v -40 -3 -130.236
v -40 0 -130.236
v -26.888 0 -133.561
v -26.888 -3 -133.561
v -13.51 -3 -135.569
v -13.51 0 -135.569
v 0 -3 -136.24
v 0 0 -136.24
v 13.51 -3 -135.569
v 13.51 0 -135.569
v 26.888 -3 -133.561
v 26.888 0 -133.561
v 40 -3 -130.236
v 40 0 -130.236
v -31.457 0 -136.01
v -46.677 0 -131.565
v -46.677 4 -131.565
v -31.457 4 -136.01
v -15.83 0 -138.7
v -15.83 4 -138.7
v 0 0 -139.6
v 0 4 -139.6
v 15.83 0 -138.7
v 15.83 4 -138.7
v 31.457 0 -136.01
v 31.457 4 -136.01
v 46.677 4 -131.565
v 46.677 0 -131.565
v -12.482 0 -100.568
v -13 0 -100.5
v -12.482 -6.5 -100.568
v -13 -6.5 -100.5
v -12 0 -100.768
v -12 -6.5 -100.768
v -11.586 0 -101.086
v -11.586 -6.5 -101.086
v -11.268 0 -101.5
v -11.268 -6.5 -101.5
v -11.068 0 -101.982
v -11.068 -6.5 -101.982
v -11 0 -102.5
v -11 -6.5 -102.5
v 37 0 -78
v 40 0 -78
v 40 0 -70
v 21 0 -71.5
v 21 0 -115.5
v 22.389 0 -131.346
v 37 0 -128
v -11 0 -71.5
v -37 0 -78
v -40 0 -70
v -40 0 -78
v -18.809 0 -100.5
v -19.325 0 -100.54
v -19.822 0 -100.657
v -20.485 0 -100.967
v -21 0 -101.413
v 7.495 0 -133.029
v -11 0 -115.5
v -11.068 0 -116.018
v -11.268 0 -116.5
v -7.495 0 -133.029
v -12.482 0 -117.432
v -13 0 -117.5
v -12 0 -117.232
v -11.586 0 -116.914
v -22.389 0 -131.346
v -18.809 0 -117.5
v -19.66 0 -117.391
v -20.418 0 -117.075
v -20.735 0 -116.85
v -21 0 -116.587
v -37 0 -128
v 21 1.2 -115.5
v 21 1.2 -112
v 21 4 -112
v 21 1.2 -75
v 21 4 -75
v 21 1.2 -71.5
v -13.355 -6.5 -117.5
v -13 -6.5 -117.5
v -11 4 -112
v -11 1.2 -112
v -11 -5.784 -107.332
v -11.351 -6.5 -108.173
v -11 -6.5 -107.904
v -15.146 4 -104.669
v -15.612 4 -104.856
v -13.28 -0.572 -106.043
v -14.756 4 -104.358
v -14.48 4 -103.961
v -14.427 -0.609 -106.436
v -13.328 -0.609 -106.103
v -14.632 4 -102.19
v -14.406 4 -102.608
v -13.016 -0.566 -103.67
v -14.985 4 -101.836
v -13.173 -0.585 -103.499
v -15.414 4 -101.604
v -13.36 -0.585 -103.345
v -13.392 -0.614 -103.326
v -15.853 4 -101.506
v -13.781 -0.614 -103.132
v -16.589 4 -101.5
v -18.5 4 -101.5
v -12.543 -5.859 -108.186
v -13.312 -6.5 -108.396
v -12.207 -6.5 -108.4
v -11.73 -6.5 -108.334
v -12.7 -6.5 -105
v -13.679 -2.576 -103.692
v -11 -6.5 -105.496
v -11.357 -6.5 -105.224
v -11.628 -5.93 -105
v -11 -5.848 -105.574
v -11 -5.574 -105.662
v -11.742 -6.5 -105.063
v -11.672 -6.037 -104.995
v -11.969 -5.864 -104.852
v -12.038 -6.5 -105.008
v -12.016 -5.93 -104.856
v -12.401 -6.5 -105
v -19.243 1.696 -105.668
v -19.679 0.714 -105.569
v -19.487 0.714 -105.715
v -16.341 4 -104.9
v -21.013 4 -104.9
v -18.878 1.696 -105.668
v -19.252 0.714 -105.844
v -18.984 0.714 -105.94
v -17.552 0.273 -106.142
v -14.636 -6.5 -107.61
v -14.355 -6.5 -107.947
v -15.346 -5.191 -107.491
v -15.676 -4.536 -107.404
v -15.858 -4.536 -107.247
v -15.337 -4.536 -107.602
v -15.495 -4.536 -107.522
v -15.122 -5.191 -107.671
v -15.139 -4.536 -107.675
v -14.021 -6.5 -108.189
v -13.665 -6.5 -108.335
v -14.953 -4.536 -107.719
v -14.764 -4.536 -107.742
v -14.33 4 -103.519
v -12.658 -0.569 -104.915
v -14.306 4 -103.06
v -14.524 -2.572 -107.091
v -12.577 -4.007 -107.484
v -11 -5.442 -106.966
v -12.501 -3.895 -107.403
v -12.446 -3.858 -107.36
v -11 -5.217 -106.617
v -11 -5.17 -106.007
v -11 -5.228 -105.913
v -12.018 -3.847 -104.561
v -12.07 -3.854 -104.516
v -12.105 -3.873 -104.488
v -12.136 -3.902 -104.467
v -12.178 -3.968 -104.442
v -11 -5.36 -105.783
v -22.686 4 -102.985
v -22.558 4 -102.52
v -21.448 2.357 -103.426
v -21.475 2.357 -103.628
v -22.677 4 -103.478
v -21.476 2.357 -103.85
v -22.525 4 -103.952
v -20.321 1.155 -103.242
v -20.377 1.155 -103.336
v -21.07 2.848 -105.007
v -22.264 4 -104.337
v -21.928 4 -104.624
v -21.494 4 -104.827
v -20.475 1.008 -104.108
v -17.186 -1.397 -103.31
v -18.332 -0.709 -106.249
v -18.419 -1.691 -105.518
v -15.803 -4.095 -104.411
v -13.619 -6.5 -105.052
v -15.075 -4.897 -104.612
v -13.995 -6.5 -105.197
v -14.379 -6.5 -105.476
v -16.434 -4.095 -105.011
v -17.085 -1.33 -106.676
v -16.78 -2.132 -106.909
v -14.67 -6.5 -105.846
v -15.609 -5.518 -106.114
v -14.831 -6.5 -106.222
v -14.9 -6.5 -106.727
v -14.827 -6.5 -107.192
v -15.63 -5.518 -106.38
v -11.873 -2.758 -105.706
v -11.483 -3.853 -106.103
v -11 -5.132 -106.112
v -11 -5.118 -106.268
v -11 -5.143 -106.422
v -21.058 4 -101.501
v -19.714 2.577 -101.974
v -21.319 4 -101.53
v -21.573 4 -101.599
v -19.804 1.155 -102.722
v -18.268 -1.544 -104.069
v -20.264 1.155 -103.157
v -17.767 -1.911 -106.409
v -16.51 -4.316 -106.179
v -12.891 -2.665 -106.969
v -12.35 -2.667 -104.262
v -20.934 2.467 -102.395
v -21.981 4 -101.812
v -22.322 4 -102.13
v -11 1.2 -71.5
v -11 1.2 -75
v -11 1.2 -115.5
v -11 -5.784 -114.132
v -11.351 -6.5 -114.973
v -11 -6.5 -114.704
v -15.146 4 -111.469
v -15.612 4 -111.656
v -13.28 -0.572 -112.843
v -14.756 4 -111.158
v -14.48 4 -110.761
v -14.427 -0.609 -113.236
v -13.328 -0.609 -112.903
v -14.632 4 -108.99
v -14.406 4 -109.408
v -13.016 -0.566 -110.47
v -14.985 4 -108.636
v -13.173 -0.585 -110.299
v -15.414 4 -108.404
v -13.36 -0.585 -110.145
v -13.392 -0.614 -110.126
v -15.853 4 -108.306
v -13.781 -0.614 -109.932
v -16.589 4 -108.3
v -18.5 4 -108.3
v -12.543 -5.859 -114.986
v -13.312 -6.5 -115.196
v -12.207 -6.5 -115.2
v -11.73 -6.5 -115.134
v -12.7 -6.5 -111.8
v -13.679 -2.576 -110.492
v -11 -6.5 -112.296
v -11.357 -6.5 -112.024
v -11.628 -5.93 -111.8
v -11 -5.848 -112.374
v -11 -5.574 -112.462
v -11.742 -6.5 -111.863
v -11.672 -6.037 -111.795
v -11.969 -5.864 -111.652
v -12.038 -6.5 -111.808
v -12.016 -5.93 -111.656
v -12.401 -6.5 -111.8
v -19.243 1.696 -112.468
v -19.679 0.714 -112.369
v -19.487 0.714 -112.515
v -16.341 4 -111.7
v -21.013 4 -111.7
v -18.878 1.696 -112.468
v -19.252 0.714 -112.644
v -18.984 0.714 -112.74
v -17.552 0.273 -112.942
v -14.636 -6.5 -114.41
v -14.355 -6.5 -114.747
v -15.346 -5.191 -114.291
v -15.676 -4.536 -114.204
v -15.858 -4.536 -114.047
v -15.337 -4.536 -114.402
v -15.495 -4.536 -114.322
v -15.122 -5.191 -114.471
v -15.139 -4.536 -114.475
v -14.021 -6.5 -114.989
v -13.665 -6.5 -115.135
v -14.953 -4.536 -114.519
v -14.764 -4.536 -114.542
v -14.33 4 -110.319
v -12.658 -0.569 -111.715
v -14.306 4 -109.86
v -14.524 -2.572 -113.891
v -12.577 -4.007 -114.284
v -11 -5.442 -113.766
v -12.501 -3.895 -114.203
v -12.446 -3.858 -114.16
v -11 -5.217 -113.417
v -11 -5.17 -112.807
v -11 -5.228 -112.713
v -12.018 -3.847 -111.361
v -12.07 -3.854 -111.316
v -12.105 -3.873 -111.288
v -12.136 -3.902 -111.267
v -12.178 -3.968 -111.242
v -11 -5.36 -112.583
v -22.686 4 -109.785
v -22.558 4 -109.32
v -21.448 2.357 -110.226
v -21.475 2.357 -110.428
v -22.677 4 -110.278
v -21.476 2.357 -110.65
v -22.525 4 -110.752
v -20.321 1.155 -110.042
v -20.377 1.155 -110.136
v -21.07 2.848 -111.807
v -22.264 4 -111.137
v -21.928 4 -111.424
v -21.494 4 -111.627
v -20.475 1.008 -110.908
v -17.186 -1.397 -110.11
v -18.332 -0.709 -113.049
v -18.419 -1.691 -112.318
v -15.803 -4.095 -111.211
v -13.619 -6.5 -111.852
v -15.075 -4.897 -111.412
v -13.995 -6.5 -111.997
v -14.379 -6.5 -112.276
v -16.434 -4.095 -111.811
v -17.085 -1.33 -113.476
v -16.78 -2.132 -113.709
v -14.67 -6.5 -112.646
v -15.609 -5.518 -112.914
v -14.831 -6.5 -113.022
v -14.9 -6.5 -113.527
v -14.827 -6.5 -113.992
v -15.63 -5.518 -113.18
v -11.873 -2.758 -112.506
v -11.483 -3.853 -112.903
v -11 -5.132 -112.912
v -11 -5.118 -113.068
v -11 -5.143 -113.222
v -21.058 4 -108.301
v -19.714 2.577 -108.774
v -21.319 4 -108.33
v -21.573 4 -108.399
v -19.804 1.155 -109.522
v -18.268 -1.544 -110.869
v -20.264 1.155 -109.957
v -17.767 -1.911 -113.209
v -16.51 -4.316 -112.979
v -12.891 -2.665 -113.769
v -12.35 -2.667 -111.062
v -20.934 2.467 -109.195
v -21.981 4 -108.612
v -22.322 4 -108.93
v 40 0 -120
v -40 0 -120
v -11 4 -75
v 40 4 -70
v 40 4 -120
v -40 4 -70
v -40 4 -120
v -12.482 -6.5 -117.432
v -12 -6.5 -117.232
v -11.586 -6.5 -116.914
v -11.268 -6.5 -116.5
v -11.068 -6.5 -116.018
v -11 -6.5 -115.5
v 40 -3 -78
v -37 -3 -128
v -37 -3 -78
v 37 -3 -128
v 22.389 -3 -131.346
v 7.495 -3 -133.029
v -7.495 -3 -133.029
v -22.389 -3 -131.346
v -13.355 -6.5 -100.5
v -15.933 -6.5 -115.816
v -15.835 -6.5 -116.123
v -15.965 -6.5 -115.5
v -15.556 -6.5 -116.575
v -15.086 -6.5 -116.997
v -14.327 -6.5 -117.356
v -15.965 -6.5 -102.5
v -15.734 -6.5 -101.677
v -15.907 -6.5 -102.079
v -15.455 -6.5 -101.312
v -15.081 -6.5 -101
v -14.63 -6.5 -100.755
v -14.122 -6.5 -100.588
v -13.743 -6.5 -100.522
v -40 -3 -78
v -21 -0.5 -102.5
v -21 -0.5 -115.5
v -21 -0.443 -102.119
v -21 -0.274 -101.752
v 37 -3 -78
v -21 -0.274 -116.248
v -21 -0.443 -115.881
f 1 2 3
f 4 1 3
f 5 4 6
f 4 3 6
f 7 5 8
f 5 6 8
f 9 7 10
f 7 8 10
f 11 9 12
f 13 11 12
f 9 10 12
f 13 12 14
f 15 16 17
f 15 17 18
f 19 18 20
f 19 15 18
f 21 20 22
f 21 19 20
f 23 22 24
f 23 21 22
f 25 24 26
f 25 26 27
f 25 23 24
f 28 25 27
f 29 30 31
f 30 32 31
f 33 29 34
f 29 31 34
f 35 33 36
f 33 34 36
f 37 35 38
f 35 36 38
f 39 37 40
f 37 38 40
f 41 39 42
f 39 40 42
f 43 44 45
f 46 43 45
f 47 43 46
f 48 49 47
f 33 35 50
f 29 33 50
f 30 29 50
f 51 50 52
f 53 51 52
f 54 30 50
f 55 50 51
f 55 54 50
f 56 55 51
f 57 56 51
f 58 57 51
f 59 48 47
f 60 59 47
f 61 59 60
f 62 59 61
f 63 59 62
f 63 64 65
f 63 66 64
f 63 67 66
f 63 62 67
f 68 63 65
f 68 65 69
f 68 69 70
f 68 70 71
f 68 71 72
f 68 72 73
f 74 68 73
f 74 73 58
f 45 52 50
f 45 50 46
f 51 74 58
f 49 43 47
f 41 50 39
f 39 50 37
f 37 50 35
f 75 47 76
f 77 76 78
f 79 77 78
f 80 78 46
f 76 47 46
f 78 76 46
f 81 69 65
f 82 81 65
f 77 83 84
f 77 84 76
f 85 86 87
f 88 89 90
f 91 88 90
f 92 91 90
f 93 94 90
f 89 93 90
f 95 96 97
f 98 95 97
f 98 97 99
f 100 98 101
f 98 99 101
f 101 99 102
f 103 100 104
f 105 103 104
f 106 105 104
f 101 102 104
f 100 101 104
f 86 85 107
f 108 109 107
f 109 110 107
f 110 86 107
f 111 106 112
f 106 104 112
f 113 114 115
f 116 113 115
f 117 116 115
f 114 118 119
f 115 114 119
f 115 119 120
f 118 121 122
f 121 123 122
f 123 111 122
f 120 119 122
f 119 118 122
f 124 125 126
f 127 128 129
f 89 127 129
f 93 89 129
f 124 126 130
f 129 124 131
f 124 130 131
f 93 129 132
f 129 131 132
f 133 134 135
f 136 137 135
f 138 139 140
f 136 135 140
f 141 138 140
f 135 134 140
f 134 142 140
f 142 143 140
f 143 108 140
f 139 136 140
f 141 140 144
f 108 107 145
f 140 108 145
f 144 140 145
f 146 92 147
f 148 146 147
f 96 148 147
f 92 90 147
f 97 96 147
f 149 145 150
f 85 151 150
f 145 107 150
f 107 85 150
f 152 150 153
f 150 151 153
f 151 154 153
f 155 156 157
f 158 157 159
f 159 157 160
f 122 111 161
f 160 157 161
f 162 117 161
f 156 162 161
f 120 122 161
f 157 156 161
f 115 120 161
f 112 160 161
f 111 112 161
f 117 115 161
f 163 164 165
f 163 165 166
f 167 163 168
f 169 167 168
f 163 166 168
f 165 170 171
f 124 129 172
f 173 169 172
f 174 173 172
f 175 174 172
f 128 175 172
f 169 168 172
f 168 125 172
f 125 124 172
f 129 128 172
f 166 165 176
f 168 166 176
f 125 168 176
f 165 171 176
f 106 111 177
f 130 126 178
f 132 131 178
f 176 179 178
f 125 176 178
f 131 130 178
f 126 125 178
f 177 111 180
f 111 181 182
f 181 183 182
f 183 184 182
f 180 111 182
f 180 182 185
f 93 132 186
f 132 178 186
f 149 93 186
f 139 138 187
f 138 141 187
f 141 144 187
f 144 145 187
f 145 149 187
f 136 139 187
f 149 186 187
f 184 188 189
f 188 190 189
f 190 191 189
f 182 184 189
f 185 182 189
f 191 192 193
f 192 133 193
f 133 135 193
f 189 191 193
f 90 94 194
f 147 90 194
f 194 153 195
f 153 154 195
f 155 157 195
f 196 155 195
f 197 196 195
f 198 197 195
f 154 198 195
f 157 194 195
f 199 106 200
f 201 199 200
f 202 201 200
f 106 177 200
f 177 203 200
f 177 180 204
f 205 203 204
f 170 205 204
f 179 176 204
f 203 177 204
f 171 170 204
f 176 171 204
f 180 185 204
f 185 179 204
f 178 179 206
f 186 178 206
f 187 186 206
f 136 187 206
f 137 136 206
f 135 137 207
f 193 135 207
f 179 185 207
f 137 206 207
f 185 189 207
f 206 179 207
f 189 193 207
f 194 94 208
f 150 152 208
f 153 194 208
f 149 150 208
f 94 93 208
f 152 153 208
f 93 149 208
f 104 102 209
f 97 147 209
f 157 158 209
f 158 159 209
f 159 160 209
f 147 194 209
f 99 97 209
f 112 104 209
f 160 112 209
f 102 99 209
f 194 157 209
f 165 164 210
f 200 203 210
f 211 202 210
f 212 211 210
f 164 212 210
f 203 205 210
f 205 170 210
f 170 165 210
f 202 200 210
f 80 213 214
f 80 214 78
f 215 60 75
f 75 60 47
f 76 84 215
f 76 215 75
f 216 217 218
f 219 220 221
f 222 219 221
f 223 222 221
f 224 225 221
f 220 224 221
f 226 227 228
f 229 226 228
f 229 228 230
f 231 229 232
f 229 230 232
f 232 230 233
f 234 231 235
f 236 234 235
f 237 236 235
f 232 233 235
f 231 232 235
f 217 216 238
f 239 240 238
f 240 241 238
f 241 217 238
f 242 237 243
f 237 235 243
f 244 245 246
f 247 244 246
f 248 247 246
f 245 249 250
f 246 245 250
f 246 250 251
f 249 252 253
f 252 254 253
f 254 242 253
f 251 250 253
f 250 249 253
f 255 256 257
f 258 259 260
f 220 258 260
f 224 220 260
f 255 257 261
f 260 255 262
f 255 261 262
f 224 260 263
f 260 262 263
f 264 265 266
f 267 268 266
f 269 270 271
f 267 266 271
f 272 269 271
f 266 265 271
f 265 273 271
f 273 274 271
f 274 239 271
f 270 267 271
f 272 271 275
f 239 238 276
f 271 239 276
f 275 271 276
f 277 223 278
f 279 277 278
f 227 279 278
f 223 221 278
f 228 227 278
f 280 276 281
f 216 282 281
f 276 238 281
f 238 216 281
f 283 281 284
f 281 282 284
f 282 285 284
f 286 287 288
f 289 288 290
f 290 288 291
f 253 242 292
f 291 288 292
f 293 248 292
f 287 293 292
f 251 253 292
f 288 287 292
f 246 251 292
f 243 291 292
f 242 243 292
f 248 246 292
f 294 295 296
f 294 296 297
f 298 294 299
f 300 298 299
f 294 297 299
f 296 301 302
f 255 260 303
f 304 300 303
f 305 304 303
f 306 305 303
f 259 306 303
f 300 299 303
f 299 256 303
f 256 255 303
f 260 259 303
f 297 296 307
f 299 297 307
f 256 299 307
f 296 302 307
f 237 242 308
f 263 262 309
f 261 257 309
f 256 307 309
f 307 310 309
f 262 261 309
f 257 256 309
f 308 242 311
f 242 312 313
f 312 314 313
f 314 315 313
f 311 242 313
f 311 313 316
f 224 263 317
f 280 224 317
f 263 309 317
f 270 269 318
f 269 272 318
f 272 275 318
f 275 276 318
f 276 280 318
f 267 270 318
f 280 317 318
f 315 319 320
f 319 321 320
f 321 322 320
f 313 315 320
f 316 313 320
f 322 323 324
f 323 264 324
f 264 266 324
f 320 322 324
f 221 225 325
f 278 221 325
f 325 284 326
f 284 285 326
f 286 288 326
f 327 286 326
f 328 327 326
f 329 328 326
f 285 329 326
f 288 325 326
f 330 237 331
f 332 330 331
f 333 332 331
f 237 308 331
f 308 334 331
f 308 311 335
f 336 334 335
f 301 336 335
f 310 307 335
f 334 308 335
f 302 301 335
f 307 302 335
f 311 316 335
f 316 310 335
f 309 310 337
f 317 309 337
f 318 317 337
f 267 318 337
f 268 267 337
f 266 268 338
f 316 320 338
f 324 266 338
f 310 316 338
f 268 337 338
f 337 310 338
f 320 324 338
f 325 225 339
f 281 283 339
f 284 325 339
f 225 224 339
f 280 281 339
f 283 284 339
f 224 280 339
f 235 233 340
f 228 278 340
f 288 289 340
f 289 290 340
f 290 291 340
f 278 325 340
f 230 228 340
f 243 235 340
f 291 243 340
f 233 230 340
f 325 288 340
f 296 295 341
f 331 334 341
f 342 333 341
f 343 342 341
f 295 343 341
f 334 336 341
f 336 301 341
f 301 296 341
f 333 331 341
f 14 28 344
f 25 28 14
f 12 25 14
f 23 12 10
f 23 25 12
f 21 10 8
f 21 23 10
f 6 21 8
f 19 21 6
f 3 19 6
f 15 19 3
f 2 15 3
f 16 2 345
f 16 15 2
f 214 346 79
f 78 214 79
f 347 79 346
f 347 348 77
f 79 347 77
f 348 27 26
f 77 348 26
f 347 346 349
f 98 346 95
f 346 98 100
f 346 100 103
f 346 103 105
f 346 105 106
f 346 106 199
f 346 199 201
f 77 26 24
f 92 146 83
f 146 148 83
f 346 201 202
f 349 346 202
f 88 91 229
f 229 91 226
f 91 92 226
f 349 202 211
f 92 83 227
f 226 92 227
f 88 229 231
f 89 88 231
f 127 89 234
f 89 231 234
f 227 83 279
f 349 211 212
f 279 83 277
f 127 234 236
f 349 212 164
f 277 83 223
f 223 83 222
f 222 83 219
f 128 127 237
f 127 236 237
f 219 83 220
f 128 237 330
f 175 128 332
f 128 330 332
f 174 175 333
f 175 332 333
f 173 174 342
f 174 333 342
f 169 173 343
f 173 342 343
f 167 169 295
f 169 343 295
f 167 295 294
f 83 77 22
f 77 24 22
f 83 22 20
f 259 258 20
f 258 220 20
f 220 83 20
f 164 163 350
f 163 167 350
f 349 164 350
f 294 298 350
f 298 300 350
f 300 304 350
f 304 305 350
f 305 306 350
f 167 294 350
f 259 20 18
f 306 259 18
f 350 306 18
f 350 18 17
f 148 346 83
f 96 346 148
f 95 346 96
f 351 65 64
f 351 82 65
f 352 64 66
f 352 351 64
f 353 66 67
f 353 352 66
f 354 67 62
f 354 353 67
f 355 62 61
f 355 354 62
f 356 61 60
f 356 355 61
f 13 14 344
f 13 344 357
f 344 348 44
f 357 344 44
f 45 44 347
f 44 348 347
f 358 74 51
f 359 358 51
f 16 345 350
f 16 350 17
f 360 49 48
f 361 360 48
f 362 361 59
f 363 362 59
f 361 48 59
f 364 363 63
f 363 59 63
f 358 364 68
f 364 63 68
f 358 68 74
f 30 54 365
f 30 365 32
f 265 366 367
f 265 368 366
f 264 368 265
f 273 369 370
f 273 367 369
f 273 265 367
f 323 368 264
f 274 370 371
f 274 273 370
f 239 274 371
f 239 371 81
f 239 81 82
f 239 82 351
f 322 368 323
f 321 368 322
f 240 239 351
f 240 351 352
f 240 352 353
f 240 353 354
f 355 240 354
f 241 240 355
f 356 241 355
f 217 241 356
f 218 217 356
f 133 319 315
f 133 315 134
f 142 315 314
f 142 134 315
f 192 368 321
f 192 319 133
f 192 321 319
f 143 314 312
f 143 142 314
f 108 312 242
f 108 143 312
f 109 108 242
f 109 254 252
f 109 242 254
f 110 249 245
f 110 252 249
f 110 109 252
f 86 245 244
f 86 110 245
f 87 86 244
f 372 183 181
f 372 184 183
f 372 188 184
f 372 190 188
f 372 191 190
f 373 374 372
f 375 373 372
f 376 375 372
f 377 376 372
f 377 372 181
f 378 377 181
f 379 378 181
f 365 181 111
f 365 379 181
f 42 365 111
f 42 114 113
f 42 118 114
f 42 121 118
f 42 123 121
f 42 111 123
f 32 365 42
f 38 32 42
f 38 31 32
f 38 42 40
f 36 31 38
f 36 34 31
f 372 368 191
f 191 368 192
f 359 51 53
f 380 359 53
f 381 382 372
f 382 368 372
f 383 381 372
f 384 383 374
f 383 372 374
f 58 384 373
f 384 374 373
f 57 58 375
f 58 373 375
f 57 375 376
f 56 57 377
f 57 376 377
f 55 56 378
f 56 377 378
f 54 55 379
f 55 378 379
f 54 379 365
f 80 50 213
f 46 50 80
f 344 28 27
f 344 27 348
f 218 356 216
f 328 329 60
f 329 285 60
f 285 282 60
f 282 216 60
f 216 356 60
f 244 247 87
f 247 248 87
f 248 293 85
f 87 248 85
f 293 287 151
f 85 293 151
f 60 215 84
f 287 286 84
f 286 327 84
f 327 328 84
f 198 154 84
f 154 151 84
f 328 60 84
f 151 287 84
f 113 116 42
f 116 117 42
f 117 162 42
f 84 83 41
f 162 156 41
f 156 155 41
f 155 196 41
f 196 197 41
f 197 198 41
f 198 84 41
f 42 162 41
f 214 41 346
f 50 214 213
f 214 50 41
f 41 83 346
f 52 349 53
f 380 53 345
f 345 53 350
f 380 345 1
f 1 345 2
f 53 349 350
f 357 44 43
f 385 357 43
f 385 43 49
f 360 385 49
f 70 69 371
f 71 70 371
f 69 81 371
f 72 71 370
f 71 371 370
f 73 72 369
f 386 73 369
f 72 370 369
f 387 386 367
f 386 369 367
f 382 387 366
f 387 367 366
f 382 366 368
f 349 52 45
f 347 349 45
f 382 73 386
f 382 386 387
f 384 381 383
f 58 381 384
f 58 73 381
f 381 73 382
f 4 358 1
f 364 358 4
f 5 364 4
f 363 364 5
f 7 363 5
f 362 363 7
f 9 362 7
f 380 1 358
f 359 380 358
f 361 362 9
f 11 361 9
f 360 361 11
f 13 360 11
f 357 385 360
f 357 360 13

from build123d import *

# Parameters (mm, degrees)
BOSS_EXTRUDE1_DEPTH = 4
CUT_EXTRUDE1_REACH  = 149.251
SKETCH2_W           = 32
SKETCH2_H           = 37
SKETCH3_W           = 32
SKETCH3_H           = 44
CUT_EXTRUDE2_DEPTH  = 1.2
BOSS_EXTRUDE2_DEPTH = 3
CUT_EXTRUDE3_REACH  = 149.251
SKETCH5_W           = 80
SKETCH5_H           = 2
SKETCH13_W          = 10
SKETCH13_H          = 17
BOSS_EXTRUDE3_DEPTH = 6.5
LPATTERN1_COUNT     = 2
LPATTERN1_PITCH     = 6.8
CHAMFER1_SIZE       = 6
CHAMFER1_SIZE2      = 5.034597787
FILLET1_R           = 2


with BuildPart() as part:
    # Sketch1 → Boss-Extrude1 (new body)
    with BuildSketch(Plane(origin=(0, 0, 0), x_dir=(1, 0, 0), z_dir=(0, 1, 0))):
        with BuildLine():
            Line((-40, 68), (-40, 120))
            Line((-40, 120), (-46.677171015, 131.565199449))
            ThreePointArc((-46.677171015, 131.565199449), (0, 139.6), (46.677171015, 131.565199449))
            Line((46.677171015, 131.565199449), (40, 120))
            Line((40, 120), (40, 68))
            Line((40, 68), (-40, 68))
        make_face()
    extrude(amount=BOSS_EXTRUDE1_DEPTH)

    # Sketch2 → Cut-Extrude1 (cut, up to next)
    with BuildSketch(Plane(origin=(0, 4, 0), x_dir=(1, 0, 0), z_dir=(0, 1, 0)), mode=Mode.PRIVATE) as cut_extrude1_sk1:
        with Locations((5, 93.5)):
            Rectangle(SKETCH2_W, SKETCH2_H)
    cut_extrude1_tool1 = extrude(cut_extrude1_sk1.sketch, amount=-CUT_EXTRUDE1_REACH, mode=Mode.PRIVATE) & part.part
    add(cut_extrude1_tool1.solids().sort_by_distance((5, 4, -93.5))[0], mode=Mode.SUBTRACT)

    # Sketch3 → Cut-Extrude2 (cut)
    with BuildSketch(Plane.XZ):
        with Locations((5, -93.5)):
            Rectangle(SKETCH3_W, SKETCH3_H)
    extrude(amount=-CUT_EXTRUDE2_DEPTH, mode=Mode.SUBTRACT)

    # Sketch4 → Boss-Extrude2 (add)
    with BuildSketch(Plane.XZ):
        with BuildLine():
            Line((-40, -78), (-40, -130.236102159))
            ThreePointArc((-40, -130.236102159), (0, -136.240384268), (40, -130.236102159))
            Line((40, -130.236102159), (40, -78))
            Line((40, -78), (37, -78))
            Line((37, -78), (37, -128))
            ThreePointArc((37, -128), (0, -133.240384268), (-37, -128))
            Line((-37, -128), (-37, -78))
            Line((-37, -78), (-40, -78))
        make_face()
    extrude(amount=BOSS_EXTRUDE2_DEPTH)

    # Sketch5 → Cut-Extrude3 (cut, up to next)
    with BuildSketch(Plane.XZ, mode=Mode.PRIVATE) as cut_extrude3_sk1:
        with Locations((0, -69)):
            Rectangle(SKETCH5_W, SKETCH5_H)
    cut_extrude3_tool1 = extrude(cut_extrude3_sk1.sketch, amount=-CUT_EXTRUDE3_REACH, mode=Mode.PRIVATE) & part.part
    add(cut_extrude3_tool1.solids().sort_by_distance((0, 0, -69))[0], mode=Mode.SUBTRACT)

    # Sketch13 → Boss-Extrude3 (add)
    with BuildSketch(Plane.XZ):
        with Locations((-16, -109)):
            Rectangle(SKETCH13_W, SKETCH13_H)
    extrude(amount=BOSS_EXTRUDE3_DEPTH)

    # Cut-Loft1: read off the stored shape, not the designer's step
    # Cut-Loft1: loft between two sections, ruled curve by curve
    cut_loft1_from = [
        Edge.make_bspline([(-18.5, 4, -108.3), (-19.001373519, 4, -108.3), (-20.004120556, 4, -108.3), (-20.723714816, 4, -108.3), (-21.292720218, 4, -108.3), (-21.789967148, 4, -108.441885809), (-22.316617117, 4, -108.86202161), (-22.630245954, 4, -109.404072839), (-22.73490999, 4, -110), (-22.630245954, 4, -110.595927161), (-22.316617117, 4, -111.13797839), (-21.789967148, 4, -111.558114191), (-21.292720218, 4, -111.7), (-20.723714816, 4, -111.7), (-20.004120556, 4, -111.7), (-18.5, 4, -111.7), (-16.995879444, 4, -111.7), (-16.276285184, 4, -111.7), (-15.707279782, 4, -111.7), (-15.210032852, 4, -111.558114191), (-14.683382883, 4, -111.13797839), (-14.369754046, 4, -110.595927161), (-14.26509001, 4, -110), (-14.369754046, 4, -109.404072839), (-14.683382883, 4, -108.86202161), (-15.210032852, 4, -108.441885809), (-15.707279782, 4, -108.3), (-16.276285184, 4, -108.3), (-16.995879444, 4, -108.3), (-17.998626481, 4, -108.3), (-18.5, 4, -108.3)], [0.419845373, 0.419845373, 0.419845373, 0.419845373, 0.459922687, 0.5, 0.5, 0.542461343, 0.584922687, 0.62738403, 0.669845373, 0.712306716, 0.75476806, 0.797229403, 0.839690746, 0.839690746, 0.87976806, 0.919845373, 0.959922687, 1, 1, 1.042461343, 1.084922687, 1.12738403, 1.169845373, 1.212306716, 1.25476806, 1.297229403, 1.339690746, 1.339690746, 1.37976806, 1.419845373, 1.419845373, 1.419845373, 1.419845373], 3),
    ]
    cut_loft1_to = [
        Edge.make_bspline([(-12.7, -6.5, -111.8), (-12.771947826, -6.5, -111.8), (-12.915843478, -6.5, -111.8), (-13.030587652, -6.5, -111.8), (-13.379489971, -6.5, -111.8), (-13.760605324, -6.5, -111.856871893), (-14.332360426, -6.5, -112.171543481), (-14.782964502, -6.5, -112.74231317), (-14.958930975, -6.5, -113.5), (-14.782964502, -6.5, -114.25768683), (-14.332360426, -6.5, -114.828456519), (-13.760605324, -6.5, -115.143128107), (-13.379489971, -6.5, -115.2), (-13.030587652, -6.5, -115.2), (-12.915843478, -6.5, -115.2), (-12.7, -6.5, -115.2), (-12.484156522, -6.5, -115.2), (-12.369412348, -6.5, -115.2), (-12.020510029, -6.5, -115.2), (-11.639394676, -6.5, -115.143128107), (-11.067639574, -6.5, -114.828456519), (-10.617035498, -6.5, -114.25768683), (-10.441069025, -6.5, -113.5), (-10.617035498, -6.5, -112.74231317), (-11.067639574, -6.5, -112.171543481), (-11.639394676, -6.5, -111.856871893), (-12.020510029, -6.5, -111.8), (-12.369412348, -6.5, -111.8), (-12.484156522, -6.5, -111.8), (-12.628052174, -6.5, -111.8), (-12.7, -6.5, -111.8)], [0.419845373, 0.419845373, 0.419845373, 0.419845373, 0.459922687, 0.5, 0.5, 0.542461343, 0.584922687, 0.62738403, 0.669845373, 0.712306716, 0.75476806, 0.797229403, 0.839690746, 0.839690746, 0.87976806, 0.919845373, 0.959922687, 1, 1, 1.042461343, 1.084922687, 1.12738403, 1.169845373, 1.212306716, 1.25476806, 1.297229403, 1.339690746, 1.339690746, 1.37976806, 1.419845373, 1.419845373, 1.419845373, 1.419845373], 3),
    ]
    cut_loft1 = Solid(Shell([*[Face.make_surface_from_curves(cut_loft1_from[k], cut_loft1_to[k]) for k in range(1)], Face(Wire(cut_loft1_from)), Face(Wire(cut_loft1_to))]))
    add(cut_loft1, mode=Mode.SUBTRACT)

    # LPattern1: Cut-Loft1 ×2
    with Locations(*[(0, 0, i * LPATTERN1_PITCH) for i in range(1, LPATTERN1_COUNT)]):
        add(cut_loft1, mode=Mode.SUBTRACT)

    # Chamfer1
    chamfer1_edges = [part.edges().sort_by_distance(p)[0] for p in [
        (-21, -6.5, -109),
    ]]
    chamfer1_side = [part.faces().sort_by_distance(p)[0] for p in [
        (-21, -3.25, -109),
    ]]
    chamfer(chamfer1_edges, length=CHAMFER1_SIZE, length2=CHAMFER1_SIZE2, reference=chamfer1_side[0])

    # Fillet1
    fillet1_edges = [part.edges().sort_by_distance(p)[0] for p in [
        (-18.482701106, -3.5, -100.5),
        (-18.482701106, -3.5, -117.5),
        (-11, -3.25, -117.5),
        (-11, -3.25, -100.5),
    ]]
    fillet(fillet1_edges, radius=FILLET1_R)


solid = part.part
